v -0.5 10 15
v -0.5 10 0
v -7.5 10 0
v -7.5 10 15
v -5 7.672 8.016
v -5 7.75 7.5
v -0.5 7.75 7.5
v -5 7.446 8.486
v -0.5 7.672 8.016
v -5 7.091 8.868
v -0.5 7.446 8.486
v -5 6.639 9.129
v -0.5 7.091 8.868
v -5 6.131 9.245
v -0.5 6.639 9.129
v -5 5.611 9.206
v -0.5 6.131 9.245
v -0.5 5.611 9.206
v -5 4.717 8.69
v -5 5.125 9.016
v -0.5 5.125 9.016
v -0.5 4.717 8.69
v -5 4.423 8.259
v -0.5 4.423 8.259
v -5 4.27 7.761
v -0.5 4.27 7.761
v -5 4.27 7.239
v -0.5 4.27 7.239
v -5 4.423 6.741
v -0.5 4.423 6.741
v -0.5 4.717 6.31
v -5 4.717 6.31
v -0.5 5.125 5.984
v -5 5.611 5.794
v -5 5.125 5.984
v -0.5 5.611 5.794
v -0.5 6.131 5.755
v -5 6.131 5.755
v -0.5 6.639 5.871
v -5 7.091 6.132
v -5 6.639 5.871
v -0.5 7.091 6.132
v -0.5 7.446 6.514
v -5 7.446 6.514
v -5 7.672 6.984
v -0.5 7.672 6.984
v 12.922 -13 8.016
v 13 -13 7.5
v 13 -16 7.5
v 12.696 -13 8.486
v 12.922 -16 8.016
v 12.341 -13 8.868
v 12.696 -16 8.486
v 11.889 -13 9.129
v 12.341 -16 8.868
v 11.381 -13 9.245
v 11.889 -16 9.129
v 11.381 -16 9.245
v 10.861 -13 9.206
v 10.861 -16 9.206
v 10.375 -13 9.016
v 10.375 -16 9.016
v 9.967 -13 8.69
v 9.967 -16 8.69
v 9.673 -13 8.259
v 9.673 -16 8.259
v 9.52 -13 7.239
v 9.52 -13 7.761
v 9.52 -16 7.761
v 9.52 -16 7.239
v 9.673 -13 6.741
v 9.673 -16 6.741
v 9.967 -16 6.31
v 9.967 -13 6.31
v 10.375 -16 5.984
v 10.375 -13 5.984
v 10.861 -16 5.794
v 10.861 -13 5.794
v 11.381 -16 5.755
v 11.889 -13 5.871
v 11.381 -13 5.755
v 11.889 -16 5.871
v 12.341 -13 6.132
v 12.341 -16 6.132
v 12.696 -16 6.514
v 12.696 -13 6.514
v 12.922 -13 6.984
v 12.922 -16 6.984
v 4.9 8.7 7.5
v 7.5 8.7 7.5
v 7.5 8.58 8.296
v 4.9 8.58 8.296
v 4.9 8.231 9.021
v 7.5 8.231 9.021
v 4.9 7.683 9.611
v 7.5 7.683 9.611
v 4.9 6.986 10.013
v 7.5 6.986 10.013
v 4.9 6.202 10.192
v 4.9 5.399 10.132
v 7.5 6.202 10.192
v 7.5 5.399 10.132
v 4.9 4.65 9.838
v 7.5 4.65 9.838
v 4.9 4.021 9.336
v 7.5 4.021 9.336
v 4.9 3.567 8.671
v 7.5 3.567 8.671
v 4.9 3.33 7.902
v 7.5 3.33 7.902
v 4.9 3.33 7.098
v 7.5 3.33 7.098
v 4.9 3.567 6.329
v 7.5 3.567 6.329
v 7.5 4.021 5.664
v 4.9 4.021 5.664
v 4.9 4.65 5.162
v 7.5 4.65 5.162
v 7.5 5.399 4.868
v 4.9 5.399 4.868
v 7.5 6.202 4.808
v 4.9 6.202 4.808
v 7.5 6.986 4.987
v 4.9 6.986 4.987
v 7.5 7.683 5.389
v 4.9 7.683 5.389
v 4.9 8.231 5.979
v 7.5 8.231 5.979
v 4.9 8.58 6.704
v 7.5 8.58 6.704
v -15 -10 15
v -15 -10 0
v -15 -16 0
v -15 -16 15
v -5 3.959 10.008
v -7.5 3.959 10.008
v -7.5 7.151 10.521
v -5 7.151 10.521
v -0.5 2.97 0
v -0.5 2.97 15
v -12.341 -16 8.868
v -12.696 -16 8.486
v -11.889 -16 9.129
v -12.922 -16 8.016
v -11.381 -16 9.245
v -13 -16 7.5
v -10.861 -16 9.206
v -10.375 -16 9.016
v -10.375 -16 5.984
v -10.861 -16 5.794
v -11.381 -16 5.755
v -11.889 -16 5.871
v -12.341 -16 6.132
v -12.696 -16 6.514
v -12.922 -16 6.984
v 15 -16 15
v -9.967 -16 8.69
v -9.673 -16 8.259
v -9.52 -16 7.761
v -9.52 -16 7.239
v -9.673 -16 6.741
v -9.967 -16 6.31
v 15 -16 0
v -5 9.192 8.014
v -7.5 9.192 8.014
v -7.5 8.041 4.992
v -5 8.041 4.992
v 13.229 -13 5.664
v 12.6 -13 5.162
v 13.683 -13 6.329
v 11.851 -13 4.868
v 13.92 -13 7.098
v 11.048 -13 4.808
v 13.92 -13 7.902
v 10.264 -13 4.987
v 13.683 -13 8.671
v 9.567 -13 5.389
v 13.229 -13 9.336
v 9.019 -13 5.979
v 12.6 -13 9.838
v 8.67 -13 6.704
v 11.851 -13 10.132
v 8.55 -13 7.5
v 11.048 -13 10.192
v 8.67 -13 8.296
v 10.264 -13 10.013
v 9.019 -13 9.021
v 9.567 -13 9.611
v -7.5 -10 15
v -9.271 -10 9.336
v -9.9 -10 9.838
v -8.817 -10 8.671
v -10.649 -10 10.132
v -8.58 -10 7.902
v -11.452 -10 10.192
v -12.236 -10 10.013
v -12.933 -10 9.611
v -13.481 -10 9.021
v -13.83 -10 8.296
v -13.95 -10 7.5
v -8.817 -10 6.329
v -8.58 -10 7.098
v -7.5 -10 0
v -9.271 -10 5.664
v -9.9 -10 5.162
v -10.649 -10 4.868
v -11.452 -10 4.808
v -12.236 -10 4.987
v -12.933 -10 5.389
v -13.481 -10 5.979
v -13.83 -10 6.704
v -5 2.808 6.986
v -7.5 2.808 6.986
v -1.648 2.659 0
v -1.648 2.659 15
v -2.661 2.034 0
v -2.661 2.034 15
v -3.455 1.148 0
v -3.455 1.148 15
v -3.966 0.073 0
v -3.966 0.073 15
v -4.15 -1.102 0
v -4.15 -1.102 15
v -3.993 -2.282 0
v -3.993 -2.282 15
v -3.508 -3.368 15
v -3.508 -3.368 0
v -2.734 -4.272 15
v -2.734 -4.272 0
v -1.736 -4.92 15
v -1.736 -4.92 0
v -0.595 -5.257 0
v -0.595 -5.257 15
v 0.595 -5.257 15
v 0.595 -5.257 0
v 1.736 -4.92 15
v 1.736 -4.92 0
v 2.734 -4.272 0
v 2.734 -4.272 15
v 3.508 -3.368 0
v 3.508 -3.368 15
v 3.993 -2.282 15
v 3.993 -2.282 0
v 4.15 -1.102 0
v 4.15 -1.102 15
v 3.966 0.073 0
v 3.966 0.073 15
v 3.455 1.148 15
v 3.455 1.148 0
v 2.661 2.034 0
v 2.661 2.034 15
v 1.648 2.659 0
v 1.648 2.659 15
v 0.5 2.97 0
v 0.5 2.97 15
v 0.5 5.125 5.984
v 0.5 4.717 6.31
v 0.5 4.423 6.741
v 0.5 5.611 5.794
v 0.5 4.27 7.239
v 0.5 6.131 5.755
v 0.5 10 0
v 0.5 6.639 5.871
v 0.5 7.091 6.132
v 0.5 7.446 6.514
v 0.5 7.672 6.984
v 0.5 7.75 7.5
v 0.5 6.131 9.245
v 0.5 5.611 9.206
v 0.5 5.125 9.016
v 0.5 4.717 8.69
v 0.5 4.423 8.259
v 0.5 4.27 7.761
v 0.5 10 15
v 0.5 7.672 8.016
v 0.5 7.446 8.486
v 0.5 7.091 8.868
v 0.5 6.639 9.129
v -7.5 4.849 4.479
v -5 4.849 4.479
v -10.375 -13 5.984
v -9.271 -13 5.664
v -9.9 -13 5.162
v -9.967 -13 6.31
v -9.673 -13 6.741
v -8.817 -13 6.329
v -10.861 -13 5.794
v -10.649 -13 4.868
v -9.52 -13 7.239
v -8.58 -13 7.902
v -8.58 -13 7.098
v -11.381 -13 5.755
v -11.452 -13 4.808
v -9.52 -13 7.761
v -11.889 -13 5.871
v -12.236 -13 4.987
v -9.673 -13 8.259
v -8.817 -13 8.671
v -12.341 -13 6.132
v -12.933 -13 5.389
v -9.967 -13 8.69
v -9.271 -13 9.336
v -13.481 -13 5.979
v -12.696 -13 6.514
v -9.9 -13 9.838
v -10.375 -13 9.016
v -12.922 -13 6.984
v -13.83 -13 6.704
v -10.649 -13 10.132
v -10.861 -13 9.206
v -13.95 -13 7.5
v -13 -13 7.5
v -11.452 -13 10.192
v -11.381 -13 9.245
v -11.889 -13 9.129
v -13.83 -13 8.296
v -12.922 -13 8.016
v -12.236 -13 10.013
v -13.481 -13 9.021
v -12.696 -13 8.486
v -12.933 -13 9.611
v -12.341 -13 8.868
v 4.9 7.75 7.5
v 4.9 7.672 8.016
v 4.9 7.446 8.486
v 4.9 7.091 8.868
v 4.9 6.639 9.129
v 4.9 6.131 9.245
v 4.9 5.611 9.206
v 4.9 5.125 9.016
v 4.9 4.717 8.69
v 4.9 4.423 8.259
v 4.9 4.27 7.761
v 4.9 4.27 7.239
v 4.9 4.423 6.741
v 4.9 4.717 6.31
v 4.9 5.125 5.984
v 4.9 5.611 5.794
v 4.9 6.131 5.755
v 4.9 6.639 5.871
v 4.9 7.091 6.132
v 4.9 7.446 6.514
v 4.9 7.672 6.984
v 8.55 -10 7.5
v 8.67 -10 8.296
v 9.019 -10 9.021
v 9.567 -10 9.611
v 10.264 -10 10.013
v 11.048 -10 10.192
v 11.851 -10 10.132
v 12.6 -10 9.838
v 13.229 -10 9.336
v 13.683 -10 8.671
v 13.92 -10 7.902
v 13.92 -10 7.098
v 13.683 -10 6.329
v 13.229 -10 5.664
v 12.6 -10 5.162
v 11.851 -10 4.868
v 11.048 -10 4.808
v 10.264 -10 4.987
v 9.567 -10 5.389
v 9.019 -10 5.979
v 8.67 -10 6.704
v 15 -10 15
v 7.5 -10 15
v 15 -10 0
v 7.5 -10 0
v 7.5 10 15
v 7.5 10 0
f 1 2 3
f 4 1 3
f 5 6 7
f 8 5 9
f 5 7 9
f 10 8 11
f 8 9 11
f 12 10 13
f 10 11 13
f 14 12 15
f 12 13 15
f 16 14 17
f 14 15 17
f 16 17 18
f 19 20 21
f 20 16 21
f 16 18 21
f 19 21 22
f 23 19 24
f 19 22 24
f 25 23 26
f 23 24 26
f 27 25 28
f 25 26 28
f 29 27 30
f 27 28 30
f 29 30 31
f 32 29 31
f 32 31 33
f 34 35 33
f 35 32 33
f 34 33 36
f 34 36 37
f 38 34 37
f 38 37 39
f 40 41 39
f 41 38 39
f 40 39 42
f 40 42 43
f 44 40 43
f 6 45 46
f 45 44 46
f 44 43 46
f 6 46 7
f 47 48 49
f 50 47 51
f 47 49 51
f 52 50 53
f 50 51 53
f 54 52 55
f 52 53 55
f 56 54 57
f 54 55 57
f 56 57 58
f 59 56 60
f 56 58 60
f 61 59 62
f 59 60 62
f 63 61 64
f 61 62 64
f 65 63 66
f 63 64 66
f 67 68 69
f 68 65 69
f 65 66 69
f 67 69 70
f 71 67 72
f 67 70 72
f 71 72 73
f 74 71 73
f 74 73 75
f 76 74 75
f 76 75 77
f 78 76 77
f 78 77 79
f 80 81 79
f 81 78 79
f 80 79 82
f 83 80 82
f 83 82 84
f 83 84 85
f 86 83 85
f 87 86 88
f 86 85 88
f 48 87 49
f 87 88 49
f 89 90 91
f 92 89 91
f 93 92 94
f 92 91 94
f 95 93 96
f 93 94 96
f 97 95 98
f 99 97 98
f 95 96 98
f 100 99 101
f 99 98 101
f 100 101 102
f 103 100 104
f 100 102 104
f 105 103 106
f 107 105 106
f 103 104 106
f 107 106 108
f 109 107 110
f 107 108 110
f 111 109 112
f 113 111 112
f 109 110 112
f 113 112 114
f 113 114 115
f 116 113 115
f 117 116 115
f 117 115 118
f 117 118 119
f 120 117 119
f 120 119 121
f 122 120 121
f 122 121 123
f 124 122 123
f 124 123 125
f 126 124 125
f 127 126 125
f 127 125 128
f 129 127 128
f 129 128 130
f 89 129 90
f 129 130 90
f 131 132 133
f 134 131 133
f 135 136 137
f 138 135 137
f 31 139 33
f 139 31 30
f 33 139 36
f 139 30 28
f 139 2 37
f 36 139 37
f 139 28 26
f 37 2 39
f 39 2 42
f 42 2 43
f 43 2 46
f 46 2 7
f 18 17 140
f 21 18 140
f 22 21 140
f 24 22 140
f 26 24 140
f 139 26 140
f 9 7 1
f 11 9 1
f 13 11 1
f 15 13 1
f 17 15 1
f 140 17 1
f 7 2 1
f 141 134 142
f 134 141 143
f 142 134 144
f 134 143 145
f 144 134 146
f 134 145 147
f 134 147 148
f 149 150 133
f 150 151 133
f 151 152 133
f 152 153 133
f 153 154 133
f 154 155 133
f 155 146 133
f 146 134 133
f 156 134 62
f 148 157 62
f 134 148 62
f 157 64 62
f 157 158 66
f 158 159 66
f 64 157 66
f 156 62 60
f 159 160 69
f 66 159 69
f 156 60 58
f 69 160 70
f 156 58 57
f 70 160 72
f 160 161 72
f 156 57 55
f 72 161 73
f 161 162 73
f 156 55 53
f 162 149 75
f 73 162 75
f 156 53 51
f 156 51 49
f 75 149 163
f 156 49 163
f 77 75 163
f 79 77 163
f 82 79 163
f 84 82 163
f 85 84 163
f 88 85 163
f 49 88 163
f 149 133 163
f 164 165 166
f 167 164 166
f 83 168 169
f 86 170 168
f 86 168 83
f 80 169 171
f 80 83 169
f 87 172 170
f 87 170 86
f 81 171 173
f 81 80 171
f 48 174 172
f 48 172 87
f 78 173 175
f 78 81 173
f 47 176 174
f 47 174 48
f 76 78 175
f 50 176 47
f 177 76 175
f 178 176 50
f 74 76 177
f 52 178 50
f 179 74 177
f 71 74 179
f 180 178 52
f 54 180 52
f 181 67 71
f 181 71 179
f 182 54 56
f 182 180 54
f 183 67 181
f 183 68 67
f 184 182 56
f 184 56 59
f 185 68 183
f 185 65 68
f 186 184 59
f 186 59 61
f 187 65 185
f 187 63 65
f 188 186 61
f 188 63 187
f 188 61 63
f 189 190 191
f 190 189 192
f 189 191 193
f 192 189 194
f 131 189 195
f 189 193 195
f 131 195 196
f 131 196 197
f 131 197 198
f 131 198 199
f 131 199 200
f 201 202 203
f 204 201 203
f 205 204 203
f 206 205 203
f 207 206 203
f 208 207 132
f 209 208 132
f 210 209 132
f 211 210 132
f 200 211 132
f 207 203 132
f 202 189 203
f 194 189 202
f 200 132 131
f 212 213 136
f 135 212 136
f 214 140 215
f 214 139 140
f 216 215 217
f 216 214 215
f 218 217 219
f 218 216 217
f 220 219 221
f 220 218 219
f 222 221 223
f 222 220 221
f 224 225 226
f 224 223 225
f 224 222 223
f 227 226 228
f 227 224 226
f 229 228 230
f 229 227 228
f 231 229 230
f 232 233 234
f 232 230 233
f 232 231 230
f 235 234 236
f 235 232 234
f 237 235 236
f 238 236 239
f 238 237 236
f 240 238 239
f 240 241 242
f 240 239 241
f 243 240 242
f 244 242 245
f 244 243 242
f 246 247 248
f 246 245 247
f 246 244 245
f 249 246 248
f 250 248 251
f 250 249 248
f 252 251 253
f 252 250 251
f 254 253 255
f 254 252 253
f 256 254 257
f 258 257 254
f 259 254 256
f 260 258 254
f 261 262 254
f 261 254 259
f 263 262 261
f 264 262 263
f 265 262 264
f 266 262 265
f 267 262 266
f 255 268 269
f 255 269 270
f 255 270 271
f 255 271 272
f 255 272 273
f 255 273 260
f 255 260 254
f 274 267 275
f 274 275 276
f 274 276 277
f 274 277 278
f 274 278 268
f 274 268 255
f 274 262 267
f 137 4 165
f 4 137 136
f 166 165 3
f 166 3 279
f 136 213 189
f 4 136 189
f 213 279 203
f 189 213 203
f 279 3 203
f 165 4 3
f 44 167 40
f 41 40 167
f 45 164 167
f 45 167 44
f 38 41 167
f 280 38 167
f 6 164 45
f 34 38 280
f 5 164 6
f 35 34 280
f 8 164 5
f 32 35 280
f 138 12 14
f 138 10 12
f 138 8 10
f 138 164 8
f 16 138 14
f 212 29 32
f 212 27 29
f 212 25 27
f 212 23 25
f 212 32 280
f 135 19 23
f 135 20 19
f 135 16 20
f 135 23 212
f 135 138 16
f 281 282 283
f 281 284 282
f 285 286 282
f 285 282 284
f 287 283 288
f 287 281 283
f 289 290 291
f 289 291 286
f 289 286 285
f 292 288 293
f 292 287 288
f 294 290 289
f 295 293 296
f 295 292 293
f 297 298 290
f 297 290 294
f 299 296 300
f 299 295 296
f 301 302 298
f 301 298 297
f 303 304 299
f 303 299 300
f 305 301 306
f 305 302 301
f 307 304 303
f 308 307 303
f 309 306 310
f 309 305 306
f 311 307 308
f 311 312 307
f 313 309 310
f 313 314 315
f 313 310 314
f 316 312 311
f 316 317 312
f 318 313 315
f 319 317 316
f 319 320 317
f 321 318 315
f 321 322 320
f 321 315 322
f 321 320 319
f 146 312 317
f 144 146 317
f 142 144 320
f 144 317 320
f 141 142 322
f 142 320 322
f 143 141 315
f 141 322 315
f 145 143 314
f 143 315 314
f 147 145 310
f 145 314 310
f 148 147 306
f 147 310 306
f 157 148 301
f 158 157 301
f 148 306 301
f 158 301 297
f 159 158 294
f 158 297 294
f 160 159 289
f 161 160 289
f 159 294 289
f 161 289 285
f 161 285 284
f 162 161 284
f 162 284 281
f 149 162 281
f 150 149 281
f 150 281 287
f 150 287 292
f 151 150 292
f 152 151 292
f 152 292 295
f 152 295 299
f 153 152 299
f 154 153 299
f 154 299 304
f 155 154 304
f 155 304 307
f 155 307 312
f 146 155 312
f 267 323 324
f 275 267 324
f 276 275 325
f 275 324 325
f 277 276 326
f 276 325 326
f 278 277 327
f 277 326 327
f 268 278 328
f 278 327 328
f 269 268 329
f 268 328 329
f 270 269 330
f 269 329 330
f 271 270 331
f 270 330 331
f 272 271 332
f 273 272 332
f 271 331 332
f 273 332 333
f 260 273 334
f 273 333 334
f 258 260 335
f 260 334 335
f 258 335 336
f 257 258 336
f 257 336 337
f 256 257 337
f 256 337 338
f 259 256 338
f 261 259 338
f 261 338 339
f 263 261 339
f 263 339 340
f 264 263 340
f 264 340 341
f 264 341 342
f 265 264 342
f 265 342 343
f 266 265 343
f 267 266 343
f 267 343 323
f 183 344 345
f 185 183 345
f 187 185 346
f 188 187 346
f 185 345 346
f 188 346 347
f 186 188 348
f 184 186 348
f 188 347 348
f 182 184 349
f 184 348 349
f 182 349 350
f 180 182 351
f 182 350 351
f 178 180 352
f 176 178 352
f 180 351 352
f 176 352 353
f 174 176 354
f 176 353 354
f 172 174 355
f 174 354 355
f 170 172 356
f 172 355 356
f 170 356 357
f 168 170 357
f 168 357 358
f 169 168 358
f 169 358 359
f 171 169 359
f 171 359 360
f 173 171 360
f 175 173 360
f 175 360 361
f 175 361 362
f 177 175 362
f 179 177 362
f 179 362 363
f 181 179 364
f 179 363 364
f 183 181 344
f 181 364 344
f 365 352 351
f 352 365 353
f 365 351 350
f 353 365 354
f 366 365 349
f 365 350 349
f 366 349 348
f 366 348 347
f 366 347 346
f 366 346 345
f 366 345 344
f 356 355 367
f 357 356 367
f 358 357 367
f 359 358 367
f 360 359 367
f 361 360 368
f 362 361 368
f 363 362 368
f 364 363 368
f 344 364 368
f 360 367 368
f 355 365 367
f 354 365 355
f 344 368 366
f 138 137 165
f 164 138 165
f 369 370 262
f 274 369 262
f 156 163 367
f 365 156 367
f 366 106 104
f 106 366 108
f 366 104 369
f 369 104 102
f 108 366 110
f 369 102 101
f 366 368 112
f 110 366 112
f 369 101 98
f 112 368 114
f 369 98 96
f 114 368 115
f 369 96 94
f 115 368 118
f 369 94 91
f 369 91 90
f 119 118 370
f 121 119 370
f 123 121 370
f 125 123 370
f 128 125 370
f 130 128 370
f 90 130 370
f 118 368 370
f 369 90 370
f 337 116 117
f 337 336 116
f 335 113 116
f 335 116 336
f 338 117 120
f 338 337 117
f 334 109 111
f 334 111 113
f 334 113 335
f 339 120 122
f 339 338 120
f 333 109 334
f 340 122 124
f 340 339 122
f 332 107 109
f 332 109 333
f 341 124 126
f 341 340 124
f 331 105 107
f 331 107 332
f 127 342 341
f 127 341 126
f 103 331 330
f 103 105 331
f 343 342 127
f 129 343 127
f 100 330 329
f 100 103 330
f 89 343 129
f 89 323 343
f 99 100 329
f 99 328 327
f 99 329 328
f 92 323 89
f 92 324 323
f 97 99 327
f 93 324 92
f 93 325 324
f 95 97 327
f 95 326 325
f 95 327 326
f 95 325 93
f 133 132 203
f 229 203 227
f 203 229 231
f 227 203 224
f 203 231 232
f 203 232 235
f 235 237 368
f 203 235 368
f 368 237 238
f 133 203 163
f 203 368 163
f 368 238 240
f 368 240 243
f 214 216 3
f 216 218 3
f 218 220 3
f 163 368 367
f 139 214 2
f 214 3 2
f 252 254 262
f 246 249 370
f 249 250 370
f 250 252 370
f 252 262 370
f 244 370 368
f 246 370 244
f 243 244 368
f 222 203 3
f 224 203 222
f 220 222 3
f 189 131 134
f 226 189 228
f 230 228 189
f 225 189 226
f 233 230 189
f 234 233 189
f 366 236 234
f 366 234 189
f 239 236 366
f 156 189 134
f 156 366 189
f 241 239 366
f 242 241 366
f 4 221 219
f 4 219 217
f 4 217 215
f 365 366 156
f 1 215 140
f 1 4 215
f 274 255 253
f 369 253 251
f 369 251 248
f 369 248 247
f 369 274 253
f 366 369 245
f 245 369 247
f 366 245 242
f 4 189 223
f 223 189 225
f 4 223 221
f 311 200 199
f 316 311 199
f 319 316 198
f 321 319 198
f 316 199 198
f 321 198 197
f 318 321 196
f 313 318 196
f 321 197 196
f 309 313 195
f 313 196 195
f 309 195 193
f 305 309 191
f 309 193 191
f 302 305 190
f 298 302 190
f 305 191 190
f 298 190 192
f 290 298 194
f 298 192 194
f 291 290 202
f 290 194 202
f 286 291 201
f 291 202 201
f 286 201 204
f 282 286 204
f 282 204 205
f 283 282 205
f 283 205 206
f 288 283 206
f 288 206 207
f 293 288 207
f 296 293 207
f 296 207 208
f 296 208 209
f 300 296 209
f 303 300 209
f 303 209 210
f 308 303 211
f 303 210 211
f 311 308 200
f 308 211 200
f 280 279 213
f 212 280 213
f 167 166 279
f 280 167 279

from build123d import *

# Parameters (mm, degrees)
F0_R      = 4.15
F1_DEPTH  = 15
F2_W      = 1
F2_H      = 15
F3_DEPTH  = 10
F6_D      = 3.5
F7_R      = 1.75
F8_DEPTH  = 25
F4_R      = 1.75
F9_DEPTH  = 22.501
F10_R     = 1.75
F11_DEPTH = 2.5
F4_R_2    = 2.7
F12_DEPTH = 2.6
F7_R_2    = 2.7
F13_DEPTH = 3
F5_R      = 2.7
F5_R_2    = 1.75
F14_DEPTH = 3


with BuildPart() as f1:
    # F0 (on Top) → F1 (new body)
    with BuildSketch(Plane.XY):
        Polygon((7.5, 10), (-7.5, 10), (-7.5, -10), (-15, -10), (-15, -16), (15, -16), (15, -10), (7.5, -10), align=None)
        with Locations((0, -1.15)):
            Circle(F0_R, mode=Mode.SUBTRACT)
    extrude(amount=F1_DEPTH)

    # F2 (on face) → F3 (cut)
    with BuildSketch(Plane(origin=(0, 10, 0), x_dir=(-1, 0, 0), z_dir=(0, 1, 0))):
        with Locations((0, 7.5)):
            Rectangle(F2_W, F2_H)
    extrude(amount=-F3_DEPTH, mode=Mode.SUBTRACT)

    # F6 (through all)
    with Locations(Plane(origin=(0, -10, 0), x_dir=(-1, 0, 0), z_dir=(0, 1, 0))):
        with Locations((-11.25, 7.5)):
            Hole(F6_D / 2)

    # F7 (on face) → F8 (cut)
    with BuildSketch(Plane(origin=(0, -10, 0), x_dir=(-1, 0, 0), z_dir=(0, 1, 0))):
        with Locations((11.25, 7.5)):
            Circle(F7_R)
    extrude(amount=-F8_DEPTH, mode=Mode.SUBTRACT)

    # F4 (on face) → F9 (cut, through all)
    with BuildSketch(Plane.YZ.offset(7.5)):
        with Locations((6, 7.5)):
            Circle(F4_R)
    extrude(amount=-F9_DEPTH, mode=Mode.SUBTRACT)

    # F10 (on face) → F11 (cut)
    with BuildSketch(Plane(origin=(-7.5, 0, 0), x_dir=(0, -1, 0), z_dir=(-1, 0, 0))):
        Polygon((-7.151114, 10.521303), (-9.192082, 8.013758), (-8.040968, 4.992455), (-4.848886, 4.478697), (-2.807918, 6.986242), (-3.959032, 10.007545), align=None)
        with Locations((-6, 7.5)):
            Circle(F10_R, mode=Mode.SUBTRACT)
    extrude(amount=-F11_DEPTH, mode=Mode.SUBTRACT)

    # F4 (on face) → F12 (cut)
    with BuildSketch(Plane.YZ.offset(7.5)):
        with Locations((6, 7.5)):
            Circle(F4_R_2)
        with Locations((6, 7.5)):
            Circle(F4_R, mode=Mode.SUBTRACT)
    extrude(amount=-F12_DEPTH, mode=Mode.SUBTRACT)

    # F7 (on face) → F13 (cut)
    with BuildSketch(Plane(origin=(0, -10, 0), x_dir=(-1, 0, 0), z_dir=(0, 1, 0))):
        with Locations((11.25, 7.5)):
            Circle(F7_R_2)
        with Locations((11.25, 7.5)):
            Circle(F7_R, mode=Mode.SUBTRACT)
    extrude(amount=-F13_DEPTH, mode=Mode.SUBTRACT)

    # F5 (on face) → F14 (cut)
    with BuildSketch(Plane(origin=(0, -10, 0), x_dir=(-1, 0, 0), z_dir=(0, 1, 0))):
        with Locations((-11.25, 7.5)):
            Circle(F5_R)
        with Locations((-11.25, 7.5)):
            Circle(F5_R_2, mode=Mode.SUBTRACT)
    extrude(amount=-F14_DEPTH, mode=Mode.SUBTRACT)


solid = f1.part
